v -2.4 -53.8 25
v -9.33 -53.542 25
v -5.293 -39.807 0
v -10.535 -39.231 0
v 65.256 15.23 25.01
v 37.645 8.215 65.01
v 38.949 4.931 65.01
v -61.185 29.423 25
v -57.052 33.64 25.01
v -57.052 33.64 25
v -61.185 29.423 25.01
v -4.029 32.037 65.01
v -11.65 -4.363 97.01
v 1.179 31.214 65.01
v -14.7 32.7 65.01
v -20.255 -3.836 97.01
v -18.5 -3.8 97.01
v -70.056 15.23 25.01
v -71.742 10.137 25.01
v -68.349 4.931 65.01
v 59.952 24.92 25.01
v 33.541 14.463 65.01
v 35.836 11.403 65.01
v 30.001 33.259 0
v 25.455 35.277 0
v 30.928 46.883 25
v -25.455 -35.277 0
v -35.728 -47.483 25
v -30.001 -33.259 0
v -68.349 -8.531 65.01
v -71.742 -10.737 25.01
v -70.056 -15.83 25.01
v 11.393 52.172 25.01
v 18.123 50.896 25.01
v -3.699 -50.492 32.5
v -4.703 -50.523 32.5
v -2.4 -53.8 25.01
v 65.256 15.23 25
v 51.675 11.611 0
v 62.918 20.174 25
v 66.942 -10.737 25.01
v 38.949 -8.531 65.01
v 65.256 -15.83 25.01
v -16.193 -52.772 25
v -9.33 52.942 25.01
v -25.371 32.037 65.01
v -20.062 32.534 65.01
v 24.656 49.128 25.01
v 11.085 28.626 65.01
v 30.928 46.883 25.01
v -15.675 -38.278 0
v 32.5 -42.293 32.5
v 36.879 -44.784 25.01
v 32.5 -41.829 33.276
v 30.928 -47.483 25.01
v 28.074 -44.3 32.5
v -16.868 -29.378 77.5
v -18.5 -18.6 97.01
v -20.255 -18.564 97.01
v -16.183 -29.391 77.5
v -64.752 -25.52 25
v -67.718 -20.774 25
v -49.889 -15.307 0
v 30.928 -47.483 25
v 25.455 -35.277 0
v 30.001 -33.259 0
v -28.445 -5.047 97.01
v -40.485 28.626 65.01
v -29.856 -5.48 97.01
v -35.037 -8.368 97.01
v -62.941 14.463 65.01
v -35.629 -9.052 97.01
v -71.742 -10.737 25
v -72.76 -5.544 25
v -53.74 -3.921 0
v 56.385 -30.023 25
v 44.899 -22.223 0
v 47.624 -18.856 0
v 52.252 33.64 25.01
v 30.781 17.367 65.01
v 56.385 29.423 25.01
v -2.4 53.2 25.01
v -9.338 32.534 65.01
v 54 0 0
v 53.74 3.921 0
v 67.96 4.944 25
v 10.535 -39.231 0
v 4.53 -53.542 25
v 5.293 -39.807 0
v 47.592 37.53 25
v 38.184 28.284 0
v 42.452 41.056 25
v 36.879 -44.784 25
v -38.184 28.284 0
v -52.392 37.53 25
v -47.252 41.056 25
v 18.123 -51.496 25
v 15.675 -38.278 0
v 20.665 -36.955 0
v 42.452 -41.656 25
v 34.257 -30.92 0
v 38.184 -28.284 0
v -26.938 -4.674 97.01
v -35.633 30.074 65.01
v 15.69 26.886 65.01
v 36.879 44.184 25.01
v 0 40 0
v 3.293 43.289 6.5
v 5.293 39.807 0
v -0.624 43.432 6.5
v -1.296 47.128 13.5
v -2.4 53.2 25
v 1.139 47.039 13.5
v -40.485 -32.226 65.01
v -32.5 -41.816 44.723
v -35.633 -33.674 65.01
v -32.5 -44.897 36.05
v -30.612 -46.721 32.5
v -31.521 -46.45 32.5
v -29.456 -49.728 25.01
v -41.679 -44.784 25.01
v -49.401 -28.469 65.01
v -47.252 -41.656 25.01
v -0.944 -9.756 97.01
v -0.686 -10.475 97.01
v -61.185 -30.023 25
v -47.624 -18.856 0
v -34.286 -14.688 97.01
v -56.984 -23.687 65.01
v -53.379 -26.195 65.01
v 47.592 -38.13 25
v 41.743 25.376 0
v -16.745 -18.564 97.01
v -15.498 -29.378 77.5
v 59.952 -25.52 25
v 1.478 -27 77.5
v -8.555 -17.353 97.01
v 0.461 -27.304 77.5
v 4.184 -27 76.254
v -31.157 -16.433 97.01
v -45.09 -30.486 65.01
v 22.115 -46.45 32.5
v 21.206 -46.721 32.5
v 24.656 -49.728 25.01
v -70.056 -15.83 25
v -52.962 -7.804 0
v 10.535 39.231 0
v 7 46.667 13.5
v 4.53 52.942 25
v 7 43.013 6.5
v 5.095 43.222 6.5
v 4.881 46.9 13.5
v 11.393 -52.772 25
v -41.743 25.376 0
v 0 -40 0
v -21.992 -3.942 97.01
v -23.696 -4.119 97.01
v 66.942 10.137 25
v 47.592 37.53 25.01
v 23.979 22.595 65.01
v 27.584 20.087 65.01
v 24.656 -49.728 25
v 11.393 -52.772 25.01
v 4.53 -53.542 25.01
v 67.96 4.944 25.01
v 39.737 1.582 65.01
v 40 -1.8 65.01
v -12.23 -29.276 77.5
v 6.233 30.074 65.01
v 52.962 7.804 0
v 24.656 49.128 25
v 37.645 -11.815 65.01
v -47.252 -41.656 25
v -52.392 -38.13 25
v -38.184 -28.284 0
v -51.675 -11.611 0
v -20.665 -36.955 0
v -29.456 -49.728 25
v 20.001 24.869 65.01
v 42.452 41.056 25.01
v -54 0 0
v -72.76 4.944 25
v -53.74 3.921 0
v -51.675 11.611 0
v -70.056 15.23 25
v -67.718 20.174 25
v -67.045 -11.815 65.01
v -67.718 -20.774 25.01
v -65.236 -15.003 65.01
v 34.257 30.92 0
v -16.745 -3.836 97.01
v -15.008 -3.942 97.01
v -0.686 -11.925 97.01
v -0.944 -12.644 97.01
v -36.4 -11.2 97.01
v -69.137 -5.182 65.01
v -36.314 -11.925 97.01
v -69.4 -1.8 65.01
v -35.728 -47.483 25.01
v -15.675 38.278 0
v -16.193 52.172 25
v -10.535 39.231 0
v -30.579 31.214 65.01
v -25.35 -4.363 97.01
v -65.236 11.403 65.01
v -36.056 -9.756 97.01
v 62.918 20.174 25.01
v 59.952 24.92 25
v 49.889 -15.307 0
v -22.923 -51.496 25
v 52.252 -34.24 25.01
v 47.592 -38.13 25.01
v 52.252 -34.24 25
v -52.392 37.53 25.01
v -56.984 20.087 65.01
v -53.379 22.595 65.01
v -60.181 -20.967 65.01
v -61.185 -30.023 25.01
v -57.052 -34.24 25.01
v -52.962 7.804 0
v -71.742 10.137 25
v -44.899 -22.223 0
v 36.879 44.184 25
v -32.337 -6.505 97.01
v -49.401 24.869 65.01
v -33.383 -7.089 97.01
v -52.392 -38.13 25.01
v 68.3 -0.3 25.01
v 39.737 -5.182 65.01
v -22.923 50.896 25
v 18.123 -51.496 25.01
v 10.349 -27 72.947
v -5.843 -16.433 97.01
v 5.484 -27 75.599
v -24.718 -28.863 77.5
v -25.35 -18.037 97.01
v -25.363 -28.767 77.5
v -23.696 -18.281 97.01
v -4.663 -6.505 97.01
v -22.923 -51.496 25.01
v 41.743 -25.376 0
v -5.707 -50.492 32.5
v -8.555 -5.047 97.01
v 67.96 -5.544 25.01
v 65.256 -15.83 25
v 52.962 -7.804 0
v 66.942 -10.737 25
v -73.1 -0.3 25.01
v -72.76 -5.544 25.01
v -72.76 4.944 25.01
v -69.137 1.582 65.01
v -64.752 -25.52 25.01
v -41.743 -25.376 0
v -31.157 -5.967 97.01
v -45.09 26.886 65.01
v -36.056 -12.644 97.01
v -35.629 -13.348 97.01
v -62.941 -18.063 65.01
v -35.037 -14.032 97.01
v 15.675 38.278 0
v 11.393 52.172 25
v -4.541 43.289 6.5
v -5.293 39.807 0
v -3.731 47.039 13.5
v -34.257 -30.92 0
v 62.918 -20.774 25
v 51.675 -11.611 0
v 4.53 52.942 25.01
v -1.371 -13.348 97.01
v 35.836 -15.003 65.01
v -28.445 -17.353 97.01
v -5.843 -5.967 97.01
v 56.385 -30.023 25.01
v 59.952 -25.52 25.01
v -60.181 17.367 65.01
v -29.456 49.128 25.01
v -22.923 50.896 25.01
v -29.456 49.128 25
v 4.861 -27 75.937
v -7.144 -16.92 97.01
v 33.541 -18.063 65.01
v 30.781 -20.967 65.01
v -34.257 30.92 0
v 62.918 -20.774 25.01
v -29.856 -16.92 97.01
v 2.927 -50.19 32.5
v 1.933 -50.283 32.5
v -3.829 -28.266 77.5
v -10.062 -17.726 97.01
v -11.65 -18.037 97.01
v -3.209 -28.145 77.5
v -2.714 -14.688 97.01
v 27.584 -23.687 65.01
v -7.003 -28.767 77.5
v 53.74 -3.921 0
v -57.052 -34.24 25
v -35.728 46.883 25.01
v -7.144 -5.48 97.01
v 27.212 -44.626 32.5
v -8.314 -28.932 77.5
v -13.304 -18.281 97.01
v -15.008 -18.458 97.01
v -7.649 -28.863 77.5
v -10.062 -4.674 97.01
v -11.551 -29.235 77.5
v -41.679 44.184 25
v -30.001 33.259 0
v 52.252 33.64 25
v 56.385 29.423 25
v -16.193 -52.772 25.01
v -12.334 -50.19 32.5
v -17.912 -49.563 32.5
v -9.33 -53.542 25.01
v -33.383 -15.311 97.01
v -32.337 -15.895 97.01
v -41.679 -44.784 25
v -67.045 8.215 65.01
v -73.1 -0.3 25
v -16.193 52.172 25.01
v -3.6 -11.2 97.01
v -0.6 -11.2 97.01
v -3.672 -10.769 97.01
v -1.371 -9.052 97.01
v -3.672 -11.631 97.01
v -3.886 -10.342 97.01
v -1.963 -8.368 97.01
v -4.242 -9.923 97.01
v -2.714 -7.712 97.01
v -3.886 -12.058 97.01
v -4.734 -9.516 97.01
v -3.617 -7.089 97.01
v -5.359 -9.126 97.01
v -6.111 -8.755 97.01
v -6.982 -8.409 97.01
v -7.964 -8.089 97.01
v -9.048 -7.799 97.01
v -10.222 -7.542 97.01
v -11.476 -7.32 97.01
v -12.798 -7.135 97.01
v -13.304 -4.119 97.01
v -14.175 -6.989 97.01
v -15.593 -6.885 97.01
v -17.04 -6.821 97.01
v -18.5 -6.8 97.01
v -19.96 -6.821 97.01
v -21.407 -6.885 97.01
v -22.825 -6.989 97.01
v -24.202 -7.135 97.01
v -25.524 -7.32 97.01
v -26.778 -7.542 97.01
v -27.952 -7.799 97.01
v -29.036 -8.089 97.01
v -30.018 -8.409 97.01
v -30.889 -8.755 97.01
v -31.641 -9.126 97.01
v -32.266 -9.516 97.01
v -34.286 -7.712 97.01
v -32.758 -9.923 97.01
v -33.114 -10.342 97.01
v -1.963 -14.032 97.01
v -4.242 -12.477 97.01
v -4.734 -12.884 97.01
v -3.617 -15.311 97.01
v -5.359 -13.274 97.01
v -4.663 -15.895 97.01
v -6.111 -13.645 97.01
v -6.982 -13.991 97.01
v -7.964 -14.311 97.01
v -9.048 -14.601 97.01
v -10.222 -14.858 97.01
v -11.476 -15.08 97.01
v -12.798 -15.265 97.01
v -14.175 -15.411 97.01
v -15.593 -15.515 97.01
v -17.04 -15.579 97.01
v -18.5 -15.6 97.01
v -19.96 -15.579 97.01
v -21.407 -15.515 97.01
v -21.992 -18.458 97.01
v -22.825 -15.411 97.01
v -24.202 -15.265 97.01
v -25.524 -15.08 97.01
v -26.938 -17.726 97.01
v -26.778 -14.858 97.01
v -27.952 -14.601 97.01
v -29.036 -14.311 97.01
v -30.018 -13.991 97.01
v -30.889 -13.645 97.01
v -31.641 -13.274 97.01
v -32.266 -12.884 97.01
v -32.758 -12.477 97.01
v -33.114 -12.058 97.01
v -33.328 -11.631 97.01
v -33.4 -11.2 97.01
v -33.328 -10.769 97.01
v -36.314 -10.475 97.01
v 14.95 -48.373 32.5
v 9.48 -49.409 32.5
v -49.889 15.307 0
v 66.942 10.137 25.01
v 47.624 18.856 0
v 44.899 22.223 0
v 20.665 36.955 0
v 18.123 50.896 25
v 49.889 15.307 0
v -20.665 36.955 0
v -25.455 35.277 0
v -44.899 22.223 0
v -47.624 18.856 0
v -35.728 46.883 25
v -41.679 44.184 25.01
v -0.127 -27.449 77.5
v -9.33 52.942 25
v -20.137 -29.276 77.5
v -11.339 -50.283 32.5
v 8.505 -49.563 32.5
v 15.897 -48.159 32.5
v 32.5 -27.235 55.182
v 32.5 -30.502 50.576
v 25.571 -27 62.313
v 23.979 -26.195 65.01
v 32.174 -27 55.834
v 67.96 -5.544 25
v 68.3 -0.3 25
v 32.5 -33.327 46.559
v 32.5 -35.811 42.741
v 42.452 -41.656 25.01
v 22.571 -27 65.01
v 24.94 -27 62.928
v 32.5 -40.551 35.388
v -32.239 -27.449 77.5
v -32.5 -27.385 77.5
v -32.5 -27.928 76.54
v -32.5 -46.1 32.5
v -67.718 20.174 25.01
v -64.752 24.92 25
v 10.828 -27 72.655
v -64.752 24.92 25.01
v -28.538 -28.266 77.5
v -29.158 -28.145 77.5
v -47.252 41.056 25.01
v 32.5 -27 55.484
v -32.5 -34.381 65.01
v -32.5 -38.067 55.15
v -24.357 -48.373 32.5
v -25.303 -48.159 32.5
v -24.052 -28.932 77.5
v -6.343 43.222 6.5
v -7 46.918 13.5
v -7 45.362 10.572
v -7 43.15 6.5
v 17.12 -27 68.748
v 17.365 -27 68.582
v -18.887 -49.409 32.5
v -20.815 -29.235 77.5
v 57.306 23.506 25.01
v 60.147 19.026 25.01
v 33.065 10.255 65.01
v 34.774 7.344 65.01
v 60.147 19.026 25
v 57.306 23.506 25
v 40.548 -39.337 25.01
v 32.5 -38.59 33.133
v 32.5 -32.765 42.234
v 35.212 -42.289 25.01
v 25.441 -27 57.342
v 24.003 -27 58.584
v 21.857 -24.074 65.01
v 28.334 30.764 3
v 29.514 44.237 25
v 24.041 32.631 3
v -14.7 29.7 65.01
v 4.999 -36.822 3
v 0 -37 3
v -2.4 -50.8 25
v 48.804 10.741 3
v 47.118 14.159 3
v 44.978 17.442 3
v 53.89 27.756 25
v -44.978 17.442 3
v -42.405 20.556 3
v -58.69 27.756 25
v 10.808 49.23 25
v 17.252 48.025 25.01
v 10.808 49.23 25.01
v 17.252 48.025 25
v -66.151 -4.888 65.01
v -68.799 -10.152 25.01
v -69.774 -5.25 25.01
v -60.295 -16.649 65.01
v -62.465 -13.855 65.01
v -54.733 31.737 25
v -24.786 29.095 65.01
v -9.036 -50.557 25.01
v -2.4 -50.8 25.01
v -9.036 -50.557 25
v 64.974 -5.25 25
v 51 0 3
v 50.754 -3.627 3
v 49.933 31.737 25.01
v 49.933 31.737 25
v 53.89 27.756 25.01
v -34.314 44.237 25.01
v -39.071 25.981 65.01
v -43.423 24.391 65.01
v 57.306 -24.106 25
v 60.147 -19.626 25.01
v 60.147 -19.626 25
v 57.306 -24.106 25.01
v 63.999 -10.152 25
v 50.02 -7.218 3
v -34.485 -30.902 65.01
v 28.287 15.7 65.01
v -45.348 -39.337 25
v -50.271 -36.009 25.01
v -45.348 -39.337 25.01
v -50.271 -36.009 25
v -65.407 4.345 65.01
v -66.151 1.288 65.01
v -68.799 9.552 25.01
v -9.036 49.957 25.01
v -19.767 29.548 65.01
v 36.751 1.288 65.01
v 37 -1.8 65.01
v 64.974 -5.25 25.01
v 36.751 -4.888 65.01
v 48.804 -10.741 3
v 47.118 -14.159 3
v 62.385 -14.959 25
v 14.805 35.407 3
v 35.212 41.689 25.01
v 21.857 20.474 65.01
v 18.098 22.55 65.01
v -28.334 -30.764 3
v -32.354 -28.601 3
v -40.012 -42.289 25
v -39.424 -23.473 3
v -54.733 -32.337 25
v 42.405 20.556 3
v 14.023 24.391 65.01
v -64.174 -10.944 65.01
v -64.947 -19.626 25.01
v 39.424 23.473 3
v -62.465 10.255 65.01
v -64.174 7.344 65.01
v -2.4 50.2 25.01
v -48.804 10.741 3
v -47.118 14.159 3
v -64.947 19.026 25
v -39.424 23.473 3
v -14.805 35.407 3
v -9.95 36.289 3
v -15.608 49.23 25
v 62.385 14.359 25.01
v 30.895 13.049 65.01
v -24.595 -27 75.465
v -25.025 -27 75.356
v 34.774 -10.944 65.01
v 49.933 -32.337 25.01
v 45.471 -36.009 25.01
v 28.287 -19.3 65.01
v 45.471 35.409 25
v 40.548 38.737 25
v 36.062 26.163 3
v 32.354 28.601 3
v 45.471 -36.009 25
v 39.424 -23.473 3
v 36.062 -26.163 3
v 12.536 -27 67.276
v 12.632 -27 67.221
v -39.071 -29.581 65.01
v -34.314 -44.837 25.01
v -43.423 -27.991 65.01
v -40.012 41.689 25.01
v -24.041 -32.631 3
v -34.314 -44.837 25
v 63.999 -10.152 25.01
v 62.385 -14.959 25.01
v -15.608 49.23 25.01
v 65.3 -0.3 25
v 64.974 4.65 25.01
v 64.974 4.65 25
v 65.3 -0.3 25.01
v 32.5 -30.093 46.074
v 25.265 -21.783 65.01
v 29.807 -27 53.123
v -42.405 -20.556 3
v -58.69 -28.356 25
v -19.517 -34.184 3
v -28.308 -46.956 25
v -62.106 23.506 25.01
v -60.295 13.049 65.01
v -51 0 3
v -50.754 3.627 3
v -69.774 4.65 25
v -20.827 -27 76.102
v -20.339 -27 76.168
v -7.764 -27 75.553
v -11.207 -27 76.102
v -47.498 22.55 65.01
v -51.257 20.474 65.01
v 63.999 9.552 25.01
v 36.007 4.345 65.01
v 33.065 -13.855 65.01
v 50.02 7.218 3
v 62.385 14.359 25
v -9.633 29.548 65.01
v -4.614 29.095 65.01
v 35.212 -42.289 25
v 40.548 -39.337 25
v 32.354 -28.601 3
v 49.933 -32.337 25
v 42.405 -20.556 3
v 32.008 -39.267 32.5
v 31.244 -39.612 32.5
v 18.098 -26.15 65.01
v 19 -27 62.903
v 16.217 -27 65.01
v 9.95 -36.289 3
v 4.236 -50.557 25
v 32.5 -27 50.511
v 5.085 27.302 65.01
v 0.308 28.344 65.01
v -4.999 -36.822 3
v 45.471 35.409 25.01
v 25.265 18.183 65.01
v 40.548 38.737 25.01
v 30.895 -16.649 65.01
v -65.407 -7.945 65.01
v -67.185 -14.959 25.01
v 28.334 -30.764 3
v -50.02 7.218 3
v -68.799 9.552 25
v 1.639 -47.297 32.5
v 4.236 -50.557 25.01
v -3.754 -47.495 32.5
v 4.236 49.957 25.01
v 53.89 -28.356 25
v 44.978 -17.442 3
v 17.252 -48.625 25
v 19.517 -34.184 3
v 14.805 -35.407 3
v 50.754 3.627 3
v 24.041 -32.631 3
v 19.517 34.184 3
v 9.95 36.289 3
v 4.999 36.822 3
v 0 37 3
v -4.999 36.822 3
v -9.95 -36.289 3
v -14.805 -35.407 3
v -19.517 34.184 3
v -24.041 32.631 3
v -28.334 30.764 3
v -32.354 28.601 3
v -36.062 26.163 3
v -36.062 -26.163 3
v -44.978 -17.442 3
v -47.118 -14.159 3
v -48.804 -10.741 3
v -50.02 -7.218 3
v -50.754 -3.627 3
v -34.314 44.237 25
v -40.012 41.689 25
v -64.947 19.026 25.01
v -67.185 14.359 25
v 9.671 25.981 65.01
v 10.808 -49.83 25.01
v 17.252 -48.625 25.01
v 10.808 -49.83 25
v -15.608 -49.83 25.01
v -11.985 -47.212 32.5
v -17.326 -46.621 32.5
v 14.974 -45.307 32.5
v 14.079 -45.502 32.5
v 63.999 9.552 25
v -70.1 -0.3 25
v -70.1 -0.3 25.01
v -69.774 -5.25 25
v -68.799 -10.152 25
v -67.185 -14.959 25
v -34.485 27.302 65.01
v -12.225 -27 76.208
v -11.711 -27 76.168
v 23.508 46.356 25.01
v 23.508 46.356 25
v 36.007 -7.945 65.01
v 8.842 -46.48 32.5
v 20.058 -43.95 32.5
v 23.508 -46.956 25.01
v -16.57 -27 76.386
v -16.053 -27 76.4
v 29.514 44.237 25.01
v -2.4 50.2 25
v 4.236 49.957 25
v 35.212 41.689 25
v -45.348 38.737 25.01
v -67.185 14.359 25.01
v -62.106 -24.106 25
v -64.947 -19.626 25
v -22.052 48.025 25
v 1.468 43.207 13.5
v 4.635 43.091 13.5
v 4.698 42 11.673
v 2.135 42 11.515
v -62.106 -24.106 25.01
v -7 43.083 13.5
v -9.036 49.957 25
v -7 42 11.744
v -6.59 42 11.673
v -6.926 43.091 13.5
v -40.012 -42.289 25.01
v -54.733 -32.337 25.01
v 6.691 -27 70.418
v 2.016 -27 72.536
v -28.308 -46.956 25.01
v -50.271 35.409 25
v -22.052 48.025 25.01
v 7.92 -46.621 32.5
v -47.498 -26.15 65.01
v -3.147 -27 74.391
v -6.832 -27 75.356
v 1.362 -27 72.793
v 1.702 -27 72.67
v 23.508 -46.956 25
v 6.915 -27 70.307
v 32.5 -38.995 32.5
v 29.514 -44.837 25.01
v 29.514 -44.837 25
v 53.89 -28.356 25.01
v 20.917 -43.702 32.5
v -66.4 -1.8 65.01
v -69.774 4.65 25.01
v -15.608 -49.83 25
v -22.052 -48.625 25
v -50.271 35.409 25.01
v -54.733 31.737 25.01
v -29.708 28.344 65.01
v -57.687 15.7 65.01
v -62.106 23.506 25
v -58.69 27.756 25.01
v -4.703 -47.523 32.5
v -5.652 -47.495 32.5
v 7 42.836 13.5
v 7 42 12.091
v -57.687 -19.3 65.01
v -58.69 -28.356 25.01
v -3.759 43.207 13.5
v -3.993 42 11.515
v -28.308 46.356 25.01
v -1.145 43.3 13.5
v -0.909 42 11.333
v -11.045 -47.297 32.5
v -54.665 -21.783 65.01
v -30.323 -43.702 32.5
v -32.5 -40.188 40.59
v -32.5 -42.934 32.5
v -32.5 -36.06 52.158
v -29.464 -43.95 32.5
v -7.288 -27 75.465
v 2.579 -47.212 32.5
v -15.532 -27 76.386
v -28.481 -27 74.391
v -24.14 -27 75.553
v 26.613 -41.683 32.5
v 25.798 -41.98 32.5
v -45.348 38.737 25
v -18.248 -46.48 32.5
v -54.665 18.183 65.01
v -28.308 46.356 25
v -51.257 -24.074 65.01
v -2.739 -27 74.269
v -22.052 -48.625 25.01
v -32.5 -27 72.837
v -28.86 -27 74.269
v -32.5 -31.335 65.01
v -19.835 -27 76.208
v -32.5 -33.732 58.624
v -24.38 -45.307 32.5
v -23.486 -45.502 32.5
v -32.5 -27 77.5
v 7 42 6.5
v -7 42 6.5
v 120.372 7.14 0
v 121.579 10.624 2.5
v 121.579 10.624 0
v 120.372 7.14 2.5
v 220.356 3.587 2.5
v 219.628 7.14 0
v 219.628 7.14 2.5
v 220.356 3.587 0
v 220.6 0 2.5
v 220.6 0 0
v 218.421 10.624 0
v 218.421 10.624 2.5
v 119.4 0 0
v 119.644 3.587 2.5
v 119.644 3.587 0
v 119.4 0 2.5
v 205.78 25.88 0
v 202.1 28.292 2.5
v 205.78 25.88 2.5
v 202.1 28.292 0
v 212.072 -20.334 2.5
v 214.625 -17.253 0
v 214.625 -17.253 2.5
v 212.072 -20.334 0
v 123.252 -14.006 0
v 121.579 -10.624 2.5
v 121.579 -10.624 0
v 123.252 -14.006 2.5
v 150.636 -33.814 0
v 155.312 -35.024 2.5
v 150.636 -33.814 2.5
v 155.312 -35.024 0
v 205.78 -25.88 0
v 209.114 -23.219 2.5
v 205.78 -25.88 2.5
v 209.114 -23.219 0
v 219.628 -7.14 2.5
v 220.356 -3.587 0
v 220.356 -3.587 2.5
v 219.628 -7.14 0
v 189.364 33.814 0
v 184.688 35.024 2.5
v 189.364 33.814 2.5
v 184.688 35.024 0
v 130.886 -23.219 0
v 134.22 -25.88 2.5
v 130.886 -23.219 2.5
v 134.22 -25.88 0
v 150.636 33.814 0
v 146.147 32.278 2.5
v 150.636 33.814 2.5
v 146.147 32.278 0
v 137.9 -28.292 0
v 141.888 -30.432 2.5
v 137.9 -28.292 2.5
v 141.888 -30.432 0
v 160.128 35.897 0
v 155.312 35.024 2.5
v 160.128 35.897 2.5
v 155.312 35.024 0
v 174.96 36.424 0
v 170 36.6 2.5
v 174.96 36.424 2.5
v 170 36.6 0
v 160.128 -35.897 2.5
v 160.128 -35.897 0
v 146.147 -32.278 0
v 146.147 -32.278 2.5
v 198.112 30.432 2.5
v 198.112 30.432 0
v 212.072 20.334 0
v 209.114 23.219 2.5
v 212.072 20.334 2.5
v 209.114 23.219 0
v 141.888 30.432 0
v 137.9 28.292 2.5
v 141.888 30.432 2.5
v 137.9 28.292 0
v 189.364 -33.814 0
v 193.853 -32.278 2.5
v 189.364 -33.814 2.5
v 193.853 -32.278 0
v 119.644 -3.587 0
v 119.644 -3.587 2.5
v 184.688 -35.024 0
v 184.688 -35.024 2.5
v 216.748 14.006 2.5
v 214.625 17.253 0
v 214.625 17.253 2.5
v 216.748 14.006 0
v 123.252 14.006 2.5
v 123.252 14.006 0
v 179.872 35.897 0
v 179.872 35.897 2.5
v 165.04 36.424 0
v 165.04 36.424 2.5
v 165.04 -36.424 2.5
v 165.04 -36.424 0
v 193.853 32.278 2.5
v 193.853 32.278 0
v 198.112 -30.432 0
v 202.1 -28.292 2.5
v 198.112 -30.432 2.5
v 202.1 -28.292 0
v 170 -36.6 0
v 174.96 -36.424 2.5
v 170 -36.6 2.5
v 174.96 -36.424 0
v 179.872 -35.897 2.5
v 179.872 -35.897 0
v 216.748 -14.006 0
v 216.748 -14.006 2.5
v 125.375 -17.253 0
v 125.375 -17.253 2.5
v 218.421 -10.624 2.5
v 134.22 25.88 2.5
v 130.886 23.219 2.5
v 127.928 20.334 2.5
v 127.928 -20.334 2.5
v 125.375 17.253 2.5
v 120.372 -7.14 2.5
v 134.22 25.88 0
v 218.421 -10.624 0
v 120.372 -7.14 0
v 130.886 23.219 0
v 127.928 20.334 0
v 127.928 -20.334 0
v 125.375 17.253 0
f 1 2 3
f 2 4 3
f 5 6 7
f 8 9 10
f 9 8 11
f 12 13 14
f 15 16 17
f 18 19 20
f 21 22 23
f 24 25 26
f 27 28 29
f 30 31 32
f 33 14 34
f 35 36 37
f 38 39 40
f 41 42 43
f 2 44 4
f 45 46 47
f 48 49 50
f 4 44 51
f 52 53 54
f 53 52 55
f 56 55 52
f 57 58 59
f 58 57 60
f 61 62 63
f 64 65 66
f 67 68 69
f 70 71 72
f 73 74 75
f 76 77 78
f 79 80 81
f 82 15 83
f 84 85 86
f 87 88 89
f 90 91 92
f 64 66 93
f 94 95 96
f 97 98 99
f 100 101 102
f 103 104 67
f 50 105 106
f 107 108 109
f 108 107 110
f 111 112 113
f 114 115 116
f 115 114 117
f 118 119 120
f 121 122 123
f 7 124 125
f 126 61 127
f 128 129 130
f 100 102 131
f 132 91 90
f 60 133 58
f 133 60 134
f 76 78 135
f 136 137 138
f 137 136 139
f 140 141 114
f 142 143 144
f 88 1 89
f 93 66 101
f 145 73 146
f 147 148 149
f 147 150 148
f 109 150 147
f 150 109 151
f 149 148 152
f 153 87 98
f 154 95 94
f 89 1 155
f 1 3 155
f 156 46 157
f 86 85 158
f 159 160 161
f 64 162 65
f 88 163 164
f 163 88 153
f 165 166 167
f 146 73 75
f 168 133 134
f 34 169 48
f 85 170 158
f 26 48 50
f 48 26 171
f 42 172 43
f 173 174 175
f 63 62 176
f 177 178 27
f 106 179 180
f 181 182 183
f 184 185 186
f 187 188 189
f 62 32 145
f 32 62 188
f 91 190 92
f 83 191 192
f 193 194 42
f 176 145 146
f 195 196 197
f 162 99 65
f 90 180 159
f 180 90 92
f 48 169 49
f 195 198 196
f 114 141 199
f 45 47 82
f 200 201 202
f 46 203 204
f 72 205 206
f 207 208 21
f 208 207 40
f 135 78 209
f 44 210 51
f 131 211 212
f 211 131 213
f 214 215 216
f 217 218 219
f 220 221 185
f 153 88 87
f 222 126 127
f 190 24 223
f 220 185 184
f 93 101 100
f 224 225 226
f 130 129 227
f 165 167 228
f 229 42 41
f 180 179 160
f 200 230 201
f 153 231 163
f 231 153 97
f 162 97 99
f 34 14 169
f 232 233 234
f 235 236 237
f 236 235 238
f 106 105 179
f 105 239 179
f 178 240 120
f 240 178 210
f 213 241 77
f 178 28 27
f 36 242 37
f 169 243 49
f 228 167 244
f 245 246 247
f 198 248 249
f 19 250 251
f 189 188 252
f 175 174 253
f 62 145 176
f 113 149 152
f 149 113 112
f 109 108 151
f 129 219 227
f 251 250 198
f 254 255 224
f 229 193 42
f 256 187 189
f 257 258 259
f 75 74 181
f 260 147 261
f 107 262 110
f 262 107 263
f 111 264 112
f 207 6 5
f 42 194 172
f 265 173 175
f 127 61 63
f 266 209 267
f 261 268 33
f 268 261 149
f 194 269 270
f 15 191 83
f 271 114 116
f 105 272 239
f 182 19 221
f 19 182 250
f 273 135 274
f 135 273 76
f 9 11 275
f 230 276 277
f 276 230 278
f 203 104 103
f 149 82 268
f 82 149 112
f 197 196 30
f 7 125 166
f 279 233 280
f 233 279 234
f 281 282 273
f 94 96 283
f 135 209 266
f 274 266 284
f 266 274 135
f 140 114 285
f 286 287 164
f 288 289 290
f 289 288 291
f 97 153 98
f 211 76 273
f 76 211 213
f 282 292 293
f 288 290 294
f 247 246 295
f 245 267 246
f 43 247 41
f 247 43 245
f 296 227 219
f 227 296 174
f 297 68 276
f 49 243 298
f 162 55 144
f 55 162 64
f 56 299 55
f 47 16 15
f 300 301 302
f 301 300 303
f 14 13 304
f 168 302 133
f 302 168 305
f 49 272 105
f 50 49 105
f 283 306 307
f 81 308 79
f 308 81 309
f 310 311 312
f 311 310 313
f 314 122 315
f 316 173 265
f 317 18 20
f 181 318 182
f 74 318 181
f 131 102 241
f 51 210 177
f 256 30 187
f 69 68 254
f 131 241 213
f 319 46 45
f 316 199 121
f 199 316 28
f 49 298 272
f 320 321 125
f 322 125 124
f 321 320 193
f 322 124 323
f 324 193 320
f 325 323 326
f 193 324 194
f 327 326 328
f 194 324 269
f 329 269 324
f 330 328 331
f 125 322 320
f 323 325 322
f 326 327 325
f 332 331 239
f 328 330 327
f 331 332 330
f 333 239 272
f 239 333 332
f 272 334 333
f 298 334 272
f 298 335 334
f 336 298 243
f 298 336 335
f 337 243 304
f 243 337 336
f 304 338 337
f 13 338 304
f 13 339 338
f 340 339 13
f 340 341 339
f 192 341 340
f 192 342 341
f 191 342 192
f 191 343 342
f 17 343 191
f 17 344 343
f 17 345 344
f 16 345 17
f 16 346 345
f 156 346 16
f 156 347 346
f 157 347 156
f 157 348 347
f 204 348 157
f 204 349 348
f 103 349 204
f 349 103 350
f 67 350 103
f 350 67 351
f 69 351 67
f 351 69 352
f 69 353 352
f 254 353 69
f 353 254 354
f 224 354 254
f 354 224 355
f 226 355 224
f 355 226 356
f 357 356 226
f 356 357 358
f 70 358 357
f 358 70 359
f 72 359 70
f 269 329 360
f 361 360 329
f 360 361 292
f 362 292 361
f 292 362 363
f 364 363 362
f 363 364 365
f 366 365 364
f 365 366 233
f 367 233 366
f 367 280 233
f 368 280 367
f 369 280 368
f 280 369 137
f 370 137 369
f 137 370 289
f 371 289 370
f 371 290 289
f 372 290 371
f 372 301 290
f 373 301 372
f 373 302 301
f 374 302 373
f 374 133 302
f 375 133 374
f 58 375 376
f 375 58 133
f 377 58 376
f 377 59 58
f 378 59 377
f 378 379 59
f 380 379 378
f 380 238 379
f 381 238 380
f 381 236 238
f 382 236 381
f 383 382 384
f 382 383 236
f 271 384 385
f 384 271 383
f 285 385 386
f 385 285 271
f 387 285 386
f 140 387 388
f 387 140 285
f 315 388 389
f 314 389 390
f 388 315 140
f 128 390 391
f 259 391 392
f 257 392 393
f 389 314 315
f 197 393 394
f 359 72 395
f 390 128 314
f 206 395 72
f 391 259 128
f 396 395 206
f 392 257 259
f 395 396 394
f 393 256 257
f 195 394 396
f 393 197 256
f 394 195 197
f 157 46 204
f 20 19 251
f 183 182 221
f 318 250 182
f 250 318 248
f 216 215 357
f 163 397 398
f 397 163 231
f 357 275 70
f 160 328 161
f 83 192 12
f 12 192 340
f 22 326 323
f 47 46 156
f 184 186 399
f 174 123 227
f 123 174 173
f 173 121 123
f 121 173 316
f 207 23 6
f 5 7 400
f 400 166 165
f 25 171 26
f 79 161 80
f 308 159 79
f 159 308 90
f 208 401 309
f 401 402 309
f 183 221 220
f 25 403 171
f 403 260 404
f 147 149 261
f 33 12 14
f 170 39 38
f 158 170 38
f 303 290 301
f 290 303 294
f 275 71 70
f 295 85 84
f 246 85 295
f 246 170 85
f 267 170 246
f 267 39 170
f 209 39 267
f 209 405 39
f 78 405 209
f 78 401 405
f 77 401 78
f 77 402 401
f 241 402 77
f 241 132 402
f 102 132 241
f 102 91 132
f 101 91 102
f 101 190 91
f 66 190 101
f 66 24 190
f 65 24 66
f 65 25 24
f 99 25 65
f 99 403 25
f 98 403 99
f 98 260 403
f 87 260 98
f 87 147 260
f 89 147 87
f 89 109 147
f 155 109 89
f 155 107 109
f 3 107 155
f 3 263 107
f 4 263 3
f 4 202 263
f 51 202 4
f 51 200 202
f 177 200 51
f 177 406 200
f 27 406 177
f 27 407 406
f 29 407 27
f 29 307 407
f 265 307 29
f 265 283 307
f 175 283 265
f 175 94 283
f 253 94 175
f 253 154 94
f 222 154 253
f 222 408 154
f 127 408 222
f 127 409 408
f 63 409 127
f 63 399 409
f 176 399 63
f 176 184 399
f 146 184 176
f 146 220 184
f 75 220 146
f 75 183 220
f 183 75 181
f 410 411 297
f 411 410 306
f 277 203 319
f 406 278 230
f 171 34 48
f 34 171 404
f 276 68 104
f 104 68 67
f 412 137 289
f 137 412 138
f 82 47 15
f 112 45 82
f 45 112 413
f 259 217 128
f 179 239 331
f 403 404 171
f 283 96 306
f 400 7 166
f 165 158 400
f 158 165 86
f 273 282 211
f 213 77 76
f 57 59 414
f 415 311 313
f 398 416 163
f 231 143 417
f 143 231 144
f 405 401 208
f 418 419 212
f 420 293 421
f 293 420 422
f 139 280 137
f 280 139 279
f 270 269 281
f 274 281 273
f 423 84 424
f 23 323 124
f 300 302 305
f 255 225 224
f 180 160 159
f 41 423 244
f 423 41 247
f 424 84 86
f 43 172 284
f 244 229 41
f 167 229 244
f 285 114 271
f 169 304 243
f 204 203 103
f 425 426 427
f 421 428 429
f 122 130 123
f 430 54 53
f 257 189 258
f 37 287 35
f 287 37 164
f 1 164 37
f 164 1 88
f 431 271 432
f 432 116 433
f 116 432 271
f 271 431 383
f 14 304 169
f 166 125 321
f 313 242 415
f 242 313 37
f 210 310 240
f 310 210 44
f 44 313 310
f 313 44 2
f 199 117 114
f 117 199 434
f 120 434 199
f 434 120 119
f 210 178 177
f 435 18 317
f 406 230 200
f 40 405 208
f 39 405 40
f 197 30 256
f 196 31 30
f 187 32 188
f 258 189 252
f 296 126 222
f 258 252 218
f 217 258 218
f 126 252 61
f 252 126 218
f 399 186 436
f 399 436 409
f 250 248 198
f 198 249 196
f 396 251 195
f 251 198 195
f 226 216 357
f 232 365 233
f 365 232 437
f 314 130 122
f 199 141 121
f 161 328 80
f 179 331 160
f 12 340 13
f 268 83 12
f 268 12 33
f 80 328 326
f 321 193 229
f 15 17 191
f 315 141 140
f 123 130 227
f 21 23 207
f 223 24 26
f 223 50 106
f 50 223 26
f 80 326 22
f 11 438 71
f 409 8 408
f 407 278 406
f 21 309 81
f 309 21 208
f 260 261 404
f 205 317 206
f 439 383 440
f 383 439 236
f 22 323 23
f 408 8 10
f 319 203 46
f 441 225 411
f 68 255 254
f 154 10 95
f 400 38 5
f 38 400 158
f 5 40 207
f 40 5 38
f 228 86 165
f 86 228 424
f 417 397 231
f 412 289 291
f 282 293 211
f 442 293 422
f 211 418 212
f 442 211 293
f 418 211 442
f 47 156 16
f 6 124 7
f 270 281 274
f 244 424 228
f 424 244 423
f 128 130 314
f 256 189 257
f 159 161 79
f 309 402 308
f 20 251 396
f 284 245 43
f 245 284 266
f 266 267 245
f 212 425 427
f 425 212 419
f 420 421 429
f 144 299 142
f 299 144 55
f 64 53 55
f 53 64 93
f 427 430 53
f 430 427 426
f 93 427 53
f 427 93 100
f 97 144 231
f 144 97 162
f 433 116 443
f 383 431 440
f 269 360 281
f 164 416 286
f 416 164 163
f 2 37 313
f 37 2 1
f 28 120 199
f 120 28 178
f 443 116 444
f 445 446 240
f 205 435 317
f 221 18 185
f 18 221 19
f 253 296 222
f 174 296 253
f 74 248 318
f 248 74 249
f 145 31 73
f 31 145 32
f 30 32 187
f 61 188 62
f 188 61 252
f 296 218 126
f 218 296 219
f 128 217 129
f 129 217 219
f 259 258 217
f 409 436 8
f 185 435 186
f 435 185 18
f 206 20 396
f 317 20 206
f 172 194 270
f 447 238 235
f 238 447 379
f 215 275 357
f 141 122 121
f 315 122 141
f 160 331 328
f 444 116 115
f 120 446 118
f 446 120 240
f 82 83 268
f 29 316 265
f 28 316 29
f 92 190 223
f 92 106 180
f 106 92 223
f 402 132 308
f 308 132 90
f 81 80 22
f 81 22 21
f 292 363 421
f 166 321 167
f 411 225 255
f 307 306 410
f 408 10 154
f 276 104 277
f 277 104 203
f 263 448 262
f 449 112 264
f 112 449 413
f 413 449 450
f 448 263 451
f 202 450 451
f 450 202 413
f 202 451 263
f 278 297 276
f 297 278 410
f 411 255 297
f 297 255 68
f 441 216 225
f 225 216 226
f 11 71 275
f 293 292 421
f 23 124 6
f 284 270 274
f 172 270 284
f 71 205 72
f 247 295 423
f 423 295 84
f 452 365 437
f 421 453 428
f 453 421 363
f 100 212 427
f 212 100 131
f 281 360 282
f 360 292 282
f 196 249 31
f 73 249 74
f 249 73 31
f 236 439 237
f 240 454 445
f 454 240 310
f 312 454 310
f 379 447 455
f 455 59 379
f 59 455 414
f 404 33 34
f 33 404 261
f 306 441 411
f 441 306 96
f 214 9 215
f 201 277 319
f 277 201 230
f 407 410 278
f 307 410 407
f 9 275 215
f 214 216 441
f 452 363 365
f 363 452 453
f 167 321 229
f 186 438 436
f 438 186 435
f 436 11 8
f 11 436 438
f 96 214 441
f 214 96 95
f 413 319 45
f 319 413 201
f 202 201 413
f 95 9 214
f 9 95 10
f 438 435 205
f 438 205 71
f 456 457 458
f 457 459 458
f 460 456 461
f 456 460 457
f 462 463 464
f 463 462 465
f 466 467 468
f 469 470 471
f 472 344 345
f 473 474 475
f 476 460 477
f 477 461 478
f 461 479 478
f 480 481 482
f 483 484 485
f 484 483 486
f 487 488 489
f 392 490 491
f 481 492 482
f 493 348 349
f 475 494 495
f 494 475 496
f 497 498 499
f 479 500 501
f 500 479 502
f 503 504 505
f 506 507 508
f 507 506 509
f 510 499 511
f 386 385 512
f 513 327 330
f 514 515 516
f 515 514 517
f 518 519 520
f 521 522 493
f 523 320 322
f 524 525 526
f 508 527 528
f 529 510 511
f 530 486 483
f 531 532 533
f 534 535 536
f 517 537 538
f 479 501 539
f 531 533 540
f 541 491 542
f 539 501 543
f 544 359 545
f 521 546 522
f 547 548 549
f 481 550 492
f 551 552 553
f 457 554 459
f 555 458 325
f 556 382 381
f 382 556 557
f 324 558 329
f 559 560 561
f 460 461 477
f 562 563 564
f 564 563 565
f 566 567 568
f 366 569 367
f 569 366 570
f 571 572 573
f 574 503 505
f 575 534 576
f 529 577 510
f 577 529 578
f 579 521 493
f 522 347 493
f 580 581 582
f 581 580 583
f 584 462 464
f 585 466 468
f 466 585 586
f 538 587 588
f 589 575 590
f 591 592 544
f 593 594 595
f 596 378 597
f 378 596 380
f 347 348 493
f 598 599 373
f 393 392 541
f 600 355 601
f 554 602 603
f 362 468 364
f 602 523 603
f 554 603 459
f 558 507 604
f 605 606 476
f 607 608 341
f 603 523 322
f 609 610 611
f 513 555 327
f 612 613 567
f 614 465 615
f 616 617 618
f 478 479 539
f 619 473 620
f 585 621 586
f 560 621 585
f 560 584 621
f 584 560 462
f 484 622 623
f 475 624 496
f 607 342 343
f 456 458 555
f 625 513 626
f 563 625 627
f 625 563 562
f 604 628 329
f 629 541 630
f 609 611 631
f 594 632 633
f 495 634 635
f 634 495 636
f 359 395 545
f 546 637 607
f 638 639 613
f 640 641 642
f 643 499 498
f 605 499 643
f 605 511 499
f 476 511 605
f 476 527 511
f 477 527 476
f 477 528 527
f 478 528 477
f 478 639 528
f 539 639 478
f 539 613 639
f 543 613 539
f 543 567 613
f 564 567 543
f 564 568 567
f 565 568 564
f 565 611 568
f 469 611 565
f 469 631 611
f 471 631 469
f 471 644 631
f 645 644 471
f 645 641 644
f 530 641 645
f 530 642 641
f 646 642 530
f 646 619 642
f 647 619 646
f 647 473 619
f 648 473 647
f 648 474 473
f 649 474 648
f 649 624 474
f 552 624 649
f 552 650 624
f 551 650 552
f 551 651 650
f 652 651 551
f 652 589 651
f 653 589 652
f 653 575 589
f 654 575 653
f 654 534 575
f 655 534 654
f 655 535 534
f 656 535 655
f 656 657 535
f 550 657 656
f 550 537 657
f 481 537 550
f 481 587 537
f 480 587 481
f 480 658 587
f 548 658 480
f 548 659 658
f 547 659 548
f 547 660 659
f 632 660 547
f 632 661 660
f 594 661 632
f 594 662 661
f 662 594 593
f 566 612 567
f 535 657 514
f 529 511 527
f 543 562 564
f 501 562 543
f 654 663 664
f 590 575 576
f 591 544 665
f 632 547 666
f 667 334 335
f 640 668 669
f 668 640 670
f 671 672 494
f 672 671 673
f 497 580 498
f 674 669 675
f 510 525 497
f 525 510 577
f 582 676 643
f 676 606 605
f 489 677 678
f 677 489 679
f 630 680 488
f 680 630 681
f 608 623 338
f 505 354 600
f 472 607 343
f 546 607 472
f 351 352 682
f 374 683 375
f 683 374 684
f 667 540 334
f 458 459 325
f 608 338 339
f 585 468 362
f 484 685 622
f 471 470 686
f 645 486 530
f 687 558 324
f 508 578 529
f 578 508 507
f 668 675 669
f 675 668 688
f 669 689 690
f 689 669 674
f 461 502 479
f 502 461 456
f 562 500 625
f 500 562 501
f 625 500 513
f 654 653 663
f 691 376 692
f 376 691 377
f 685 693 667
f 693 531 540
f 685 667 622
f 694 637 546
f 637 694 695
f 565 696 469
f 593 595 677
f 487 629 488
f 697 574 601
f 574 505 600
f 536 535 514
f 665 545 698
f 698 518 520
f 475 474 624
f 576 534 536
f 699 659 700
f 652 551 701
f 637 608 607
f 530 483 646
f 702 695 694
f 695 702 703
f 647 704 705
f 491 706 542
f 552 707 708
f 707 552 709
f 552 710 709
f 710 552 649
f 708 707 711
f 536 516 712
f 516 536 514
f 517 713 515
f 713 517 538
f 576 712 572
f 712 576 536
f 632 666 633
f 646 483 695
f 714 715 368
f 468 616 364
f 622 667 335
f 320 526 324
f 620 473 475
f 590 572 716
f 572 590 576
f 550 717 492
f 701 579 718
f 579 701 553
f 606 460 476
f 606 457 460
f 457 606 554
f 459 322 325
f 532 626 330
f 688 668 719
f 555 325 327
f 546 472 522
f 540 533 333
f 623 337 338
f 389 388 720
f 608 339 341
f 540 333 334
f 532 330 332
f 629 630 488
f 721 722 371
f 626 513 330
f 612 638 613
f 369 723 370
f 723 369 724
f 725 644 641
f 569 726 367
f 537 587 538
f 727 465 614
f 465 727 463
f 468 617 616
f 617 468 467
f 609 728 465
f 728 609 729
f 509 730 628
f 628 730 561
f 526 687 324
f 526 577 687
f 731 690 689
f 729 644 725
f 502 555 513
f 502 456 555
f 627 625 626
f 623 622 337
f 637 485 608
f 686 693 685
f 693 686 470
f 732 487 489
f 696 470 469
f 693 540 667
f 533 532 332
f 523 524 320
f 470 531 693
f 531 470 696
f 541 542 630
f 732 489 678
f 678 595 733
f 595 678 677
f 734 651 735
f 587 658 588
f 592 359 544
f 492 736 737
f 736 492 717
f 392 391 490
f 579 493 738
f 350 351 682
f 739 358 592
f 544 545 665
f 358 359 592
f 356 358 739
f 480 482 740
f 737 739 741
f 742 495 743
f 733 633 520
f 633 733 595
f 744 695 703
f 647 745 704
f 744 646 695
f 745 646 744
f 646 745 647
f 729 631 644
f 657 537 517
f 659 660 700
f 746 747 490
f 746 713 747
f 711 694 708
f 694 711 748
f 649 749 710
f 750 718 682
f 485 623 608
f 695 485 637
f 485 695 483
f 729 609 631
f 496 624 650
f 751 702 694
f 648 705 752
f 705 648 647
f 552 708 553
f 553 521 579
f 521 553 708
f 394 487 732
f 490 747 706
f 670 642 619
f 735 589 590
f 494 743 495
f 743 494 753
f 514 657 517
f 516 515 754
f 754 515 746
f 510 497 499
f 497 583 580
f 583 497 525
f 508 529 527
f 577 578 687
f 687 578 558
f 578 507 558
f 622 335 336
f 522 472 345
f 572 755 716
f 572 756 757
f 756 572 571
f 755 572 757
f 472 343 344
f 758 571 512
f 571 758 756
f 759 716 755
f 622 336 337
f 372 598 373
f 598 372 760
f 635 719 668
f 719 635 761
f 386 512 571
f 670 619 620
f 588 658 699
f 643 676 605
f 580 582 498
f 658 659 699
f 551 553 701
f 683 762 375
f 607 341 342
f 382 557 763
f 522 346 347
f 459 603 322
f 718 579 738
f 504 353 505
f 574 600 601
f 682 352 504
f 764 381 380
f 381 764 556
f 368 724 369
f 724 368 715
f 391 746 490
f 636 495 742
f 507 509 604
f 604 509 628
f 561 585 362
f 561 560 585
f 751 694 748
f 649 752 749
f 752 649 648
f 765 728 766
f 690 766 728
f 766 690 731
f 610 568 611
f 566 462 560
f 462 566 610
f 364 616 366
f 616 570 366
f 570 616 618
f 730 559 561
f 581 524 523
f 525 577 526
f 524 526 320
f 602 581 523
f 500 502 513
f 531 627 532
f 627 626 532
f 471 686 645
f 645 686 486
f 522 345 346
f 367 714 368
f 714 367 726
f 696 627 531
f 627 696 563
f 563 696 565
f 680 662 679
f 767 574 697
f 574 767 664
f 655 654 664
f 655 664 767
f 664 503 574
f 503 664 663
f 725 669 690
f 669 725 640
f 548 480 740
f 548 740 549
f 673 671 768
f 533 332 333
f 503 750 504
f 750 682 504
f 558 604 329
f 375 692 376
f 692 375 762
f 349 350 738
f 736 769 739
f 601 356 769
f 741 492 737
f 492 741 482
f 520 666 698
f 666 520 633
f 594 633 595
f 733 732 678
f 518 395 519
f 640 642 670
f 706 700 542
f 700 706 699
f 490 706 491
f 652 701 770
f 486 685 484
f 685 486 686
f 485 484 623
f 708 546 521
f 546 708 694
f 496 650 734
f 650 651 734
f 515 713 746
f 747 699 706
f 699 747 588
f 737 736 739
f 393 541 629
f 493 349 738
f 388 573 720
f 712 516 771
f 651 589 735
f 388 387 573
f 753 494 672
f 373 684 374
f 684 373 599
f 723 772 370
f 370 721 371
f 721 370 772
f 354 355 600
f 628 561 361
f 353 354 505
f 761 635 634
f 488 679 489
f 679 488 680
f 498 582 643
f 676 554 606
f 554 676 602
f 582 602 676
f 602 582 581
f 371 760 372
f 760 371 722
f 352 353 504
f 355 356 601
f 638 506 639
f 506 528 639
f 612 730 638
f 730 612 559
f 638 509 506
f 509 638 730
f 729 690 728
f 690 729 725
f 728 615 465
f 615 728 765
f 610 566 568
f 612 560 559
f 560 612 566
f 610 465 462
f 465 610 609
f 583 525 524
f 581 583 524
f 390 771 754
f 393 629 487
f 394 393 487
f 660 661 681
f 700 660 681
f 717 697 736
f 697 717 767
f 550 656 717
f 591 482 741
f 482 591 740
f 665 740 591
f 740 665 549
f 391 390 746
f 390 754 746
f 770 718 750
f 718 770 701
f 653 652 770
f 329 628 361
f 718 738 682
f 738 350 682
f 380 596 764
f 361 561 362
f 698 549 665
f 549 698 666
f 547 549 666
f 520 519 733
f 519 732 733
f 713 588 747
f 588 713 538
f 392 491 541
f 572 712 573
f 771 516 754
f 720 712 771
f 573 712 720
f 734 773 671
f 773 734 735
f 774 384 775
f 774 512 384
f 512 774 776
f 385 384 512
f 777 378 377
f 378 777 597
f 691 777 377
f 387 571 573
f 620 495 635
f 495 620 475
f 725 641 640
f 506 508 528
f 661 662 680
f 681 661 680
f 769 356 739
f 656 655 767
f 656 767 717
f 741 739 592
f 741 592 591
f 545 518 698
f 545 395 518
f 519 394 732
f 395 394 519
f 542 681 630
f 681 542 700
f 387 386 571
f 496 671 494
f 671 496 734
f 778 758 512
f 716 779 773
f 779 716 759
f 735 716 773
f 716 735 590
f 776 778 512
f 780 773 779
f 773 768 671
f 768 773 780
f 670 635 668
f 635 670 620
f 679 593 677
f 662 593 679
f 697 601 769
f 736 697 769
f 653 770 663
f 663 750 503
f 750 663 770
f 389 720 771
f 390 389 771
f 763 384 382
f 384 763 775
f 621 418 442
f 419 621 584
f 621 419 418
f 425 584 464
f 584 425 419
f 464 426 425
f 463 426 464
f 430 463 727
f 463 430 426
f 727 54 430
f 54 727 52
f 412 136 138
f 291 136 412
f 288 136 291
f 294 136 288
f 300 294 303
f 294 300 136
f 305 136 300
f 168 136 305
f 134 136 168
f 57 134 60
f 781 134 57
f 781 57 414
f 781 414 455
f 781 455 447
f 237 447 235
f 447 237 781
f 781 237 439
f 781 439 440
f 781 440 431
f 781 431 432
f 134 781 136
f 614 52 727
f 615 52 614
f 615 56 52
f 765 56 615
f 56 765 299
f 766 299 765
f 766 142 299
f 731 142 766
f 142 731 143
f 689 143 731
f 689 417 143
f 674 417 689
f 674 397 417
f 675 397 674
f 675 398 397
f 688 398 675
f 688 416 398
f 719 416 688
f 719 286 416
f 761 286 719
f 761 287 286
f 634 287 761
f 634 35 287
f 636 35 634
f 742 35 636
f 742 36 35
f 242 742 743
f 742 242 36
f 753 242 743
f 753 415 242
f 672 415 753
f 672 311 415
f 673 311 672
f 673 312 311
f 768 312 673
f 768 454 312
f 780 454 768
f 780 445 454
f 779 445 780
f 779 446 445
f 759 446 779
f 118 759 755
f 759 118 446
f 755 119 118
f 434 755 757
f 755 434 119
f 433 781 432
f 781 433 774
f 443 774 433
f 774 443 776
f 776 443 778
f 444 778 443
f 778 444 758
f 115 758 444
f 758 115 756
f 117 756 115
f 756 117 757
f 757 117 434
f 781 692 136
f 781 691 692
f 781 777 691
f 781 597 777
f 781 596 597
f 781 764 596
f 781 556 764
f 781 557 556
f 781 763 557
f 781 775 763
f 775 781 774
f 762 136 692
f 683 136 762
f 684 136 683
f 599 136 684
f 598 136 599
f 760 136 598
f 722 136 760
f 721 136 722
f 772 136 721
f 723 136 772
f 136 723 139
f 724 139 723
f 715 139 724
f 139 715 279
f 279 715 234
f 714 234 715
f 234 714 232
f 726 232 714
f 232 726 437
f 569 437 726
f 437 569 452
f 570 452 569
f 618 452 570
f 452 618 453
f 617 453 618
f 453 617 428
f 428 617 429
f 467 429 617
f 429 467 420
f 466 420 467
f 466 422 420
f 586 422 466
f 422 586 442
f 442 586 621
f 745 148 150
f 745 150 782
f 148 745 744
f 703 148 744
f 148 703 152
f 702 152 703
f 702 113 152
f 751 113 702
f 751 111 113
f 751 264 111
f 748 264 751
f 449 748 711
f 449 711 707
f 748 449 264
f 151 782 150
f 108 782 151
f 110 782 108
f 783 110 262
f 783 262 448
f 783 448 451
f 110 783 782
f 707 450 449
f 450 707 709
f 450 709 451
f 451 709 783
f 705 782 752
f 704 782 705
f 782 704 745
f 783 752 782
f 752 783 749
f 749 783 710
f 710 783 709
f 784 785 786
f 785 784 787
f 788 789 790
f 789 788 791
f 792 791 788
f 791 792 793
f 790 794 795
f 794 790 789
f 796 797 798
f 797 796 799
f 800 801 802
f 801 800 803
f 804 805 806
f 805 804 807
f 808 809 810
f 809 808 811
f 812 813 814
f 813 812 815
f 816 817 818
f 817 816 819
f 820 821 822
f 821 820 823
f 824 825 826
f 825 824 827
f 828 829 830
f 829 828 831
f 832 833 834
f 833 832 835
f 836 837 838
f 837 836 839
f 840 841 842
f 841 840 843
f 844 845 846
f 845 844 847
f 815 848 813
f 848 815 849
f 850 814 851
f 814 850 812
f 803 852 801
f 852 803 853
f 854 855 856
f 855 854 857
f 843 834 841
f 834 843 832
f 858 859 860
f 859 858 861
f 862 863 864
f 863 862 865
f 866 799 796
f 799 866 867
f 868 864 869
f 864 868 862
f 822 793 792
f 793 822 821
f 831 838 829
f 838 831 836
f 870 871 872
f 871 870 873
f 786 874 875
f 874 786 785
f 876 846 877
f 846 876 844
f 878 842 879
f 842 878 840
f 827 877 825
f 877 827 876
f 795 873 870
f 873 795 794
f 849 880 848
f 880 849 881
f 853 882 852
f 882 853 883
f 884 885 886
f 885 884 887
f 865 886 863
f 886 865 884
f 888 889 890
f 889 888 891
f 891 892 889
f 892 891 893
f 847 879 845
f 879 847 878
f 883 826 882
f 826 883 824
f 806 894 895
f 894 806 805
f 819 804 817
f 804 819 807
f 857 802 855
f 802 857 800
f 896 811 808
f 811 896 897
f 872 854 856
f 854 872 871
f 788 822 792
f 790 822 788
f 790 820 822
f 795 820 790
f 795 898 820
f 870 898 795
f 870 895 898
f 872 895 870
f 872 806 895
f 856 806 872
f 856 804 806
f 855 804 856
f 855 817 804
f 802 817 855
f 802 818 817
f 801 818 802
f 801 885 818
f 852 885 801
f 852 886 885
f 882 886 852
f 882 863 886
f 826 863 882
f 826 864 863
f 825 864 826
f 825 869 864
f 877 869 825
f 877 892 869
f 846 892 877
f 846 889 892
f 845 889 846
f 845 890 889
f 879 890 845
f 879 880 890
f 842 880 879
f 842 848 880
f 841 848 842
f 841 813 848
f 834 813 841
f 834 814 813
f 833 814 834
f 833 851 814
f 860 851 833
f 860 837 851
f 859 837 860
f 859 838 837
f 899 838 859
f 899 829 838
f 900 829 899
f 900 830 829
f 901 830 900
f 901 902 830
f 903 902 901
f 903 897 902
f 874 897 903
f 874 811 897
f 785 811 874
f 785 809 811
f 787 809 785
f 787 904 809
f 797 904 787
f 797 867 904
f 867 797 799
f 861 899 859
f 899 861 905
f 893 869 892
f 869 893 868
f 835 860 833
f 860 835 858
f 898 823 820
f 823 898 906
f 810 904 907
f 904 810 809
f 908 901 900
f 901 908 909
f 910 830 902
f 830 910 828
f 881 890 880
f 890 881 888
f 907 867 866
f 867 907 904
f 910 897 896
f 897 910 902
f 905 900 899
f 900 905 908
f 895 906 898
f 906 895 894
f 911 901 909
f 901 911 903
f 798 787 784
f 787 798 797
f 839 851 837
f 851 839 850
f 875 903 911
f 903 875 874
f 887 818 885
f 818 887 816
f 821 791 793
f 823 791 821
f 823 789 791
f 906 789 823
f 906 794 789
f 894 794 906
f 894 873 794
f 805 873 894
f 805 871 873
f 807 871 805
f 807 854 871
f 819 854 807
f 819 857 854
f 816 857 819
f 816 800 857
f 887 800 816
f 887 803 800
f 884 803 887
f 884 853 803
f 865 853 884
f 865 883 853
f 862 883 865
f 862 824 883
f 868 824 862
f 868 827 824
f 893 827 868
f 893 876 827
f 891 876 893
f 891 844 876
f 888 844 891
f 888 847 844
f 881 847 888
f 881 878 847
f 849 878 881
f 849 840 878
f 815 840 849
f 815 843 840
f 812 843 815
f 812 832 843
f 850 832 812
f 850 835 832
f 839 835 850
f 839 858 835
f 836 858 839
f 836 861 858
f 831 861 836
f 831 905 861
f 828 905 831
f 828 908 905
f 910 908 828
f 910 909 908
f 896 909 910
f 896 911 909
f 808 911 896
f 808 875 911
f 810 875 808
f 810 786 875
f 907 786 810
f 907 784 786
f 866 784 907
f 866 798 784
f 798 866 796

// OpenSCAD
// ============================================================
// SEISMONITOR ENCLOSURE — Organic dome monolith (v1)
// Parametric OpenSCAD — reverse-engineered from
// SeisMonitor_Prototype001b.stl (Rhinoceros, Apr 2026)
//
// Body construction: hull() of 4 positioned elliptical cross-
// sections reproduces the expanding-then-tapering dome profile
// and ~20 mm X-lean of the original Rhino prototype.
//
// Overall envelope (matching STL): ≈145 × 108 × 97 mm
//   Base (Z=0):   108 × 80 mm ellipse
//   Widest (Z=25): 141 × 107 mm ellipse  (+X bulge)
//   Mid (Z=65):   109 × 69 mm ellipse    (centre drifts −X)
//   Top (Z=97):    36 × 15 mm ellipse    (further −X lean)
//
// Parts:
//   PART = "shell"       → main enclosure body
//   PART = "base_cover"  → flat snap-on base plate
//   PART = "all"         → both side-by-side
//
// Print suggestion: dome-up orientation, tree supports for the
// undercut base rim, 0.2 mm layers, 3 perimeters, PETG or PLA.
// ============================================================

PART = "all";   // "shell", "base_cover", or "all"

$fn = 64;

// ─── Wall thickness ──────────────────────────────────────────
wall = 3.0;

// ─── Cross-section control points ────────────────────────────
// [z_height, x_center_offset, y_center_offset, x_radius, y_radius]
// Offsets are relative to the base footprint centre.
// Derived from STL slice analysis.
cs = [
  [  0,    0.0,    0.0,  54.0,  40.0 ],   // Z=0  — base footprint
  [ 25,   -2.4,   -0.3,  70.7,  53.5 ],   // Z=25 — widest section
  [ 65,  -14.7,   -1.8,  54.7,  34.5 ],   // Z=65 — upper taper start
  [ 97,  -18.5,  -11.2,  17.9,   7.4 ],   // Z=97 — top crown
];

// ─── Screen / display placeholder ────────────────────────────
// Screen is on the FRONT face (−Y face of the dome).
// Coordinate system: base centre = (0,0,0).
// At Z=55: outer front face ≈ Y = −40.7 mm  (from hull() interpolation).
// The cut slab runs from Y=−52 to Y=−30 → passes through the 3 mm front wall.
// Adjust w/h once PCB / display specs are confirmed.
scr_w       = 65;    // screen window width (mm)
scr_h       = 45;    // screen window height (mm)
scr_z_ctr   = 55;    // Z-centre of window
scr_y_cut   = -52;   // Y-start of cut slab (outside the front face)
scr_y_len   = 25;    // slab depth in Y (must span the ~3 mm wall)

// ─── USB-C / power port (rear base) ──────────────────────────
// At Z=10: outer back face ≈ Y = +45.3 mm  (hull() interpolation).
// The cut slab runs from Y=+42 to Y=+55 → passes through the ~3 mm rear wall.
usb_w       = 14;
usb_h       = 7;
usb_z_ctr   = 10;    // height above base
usb_y_cut   = 42;    // Y-start of cut slab (just inside back face)
usb_y_len   = 14;    // slab depth in Y (must span the rear wall)

// ─── Base cover clearance ────────────────────────────────────
cover_t       = 2.5;
cover_gap     = 0.4;   // radial gap between shell rim and cover

// ─── Helpers ─────────────────────────────────────────────────

// Thin elliptical disk used as a hull() seed.
module ellipse_disk(rx, ry, h = 0.01) {
  scale([rx, ry, 1]) cylinder(r = 1, h = h, $fn = 64);
}

// ─── Core solids ─────────────────────────────────────────────

// Outer envelope: hull of the 4 cross-sections.
module outer_solid() {
  hull()
    for (c = cs)
      translate([c[1], c[2], c[0]])
        ellipse_disk(c[3], c[4]);
}

// Inner cavity: same profile, radii shrunk by wall, floor raised by wall.
module inner_solid() {
  hull()
    for (c = cs)
      translate([c[1], c[2], (c[0] == 0) ? wall : c[0]])
        ellipse_disk(max(1, c[3] - wall), max(1, c[4] - wall));
}

// ─── Features ────────────────────────────────────────────────

// Screen window: rectangular cut through the −Y (front) face.
// The slab starts outside the dome (scr_y_cut) and runs scr_y_len inward,
// passing cleanly through the ≈3 mm front wall.
module screen_window_cut() {
  translate([-scr_w/2, scr_y_cut, scr_z_ctr - scr_h/2])
    cube([scr_w, scr_y_len, scr_h]);
}

// USB-C pocket: through the +Y (rear) face near the base.
// Slab starts just below the outer back surface and runs inward.
module usb_pocket_cut() {
  translate([-usb_w/2, usb_y_cut, usb_z_ctr - usb_h/2])
    cube([usb_w, usb_y_len, usb_h]);
}

// Bottom opening: removes the base so the PCB can be inserted,
// leaving a perimeter rim of width wall.
// (Uncomment once PCB dimensions are confirmed.)
/*
module base_opening() {
  // slightly smaller than base footprint
  hull()
    translate([cs[0][1], cs[0][2], -1])
      ellipse_disk(cs[0][3] - wall - 2, cs[0][4] - wall - 2, h=wall+2);
}
*/

// ─── Main shell ──────────────────────────────────────────────
module shell() {
  difference() {
    union() {
      // Hollow wall
      difference() {
        outer_solid();
        inner_solid();
      }
      // TODO: add PCB mount bosses, snap catches, etc.
    }

    // Screen cut-out
    screen_window_cut();

    // USB port
    usb_pocket_cut();
  }
}

// ─── Base cover (flat snap-on disc) ──────────────────────────
module base_cover() {
  rx = cs[0][3] - wall - cover_gap;
  ry = cs[0][4] - wall - cover_gap;
  // Simple flat disc — add snap arms / screws once feature list finalised
  scale([rx, ry, 1]) cylinder(r=1, h=cover_t, $fn=64);
}

// ─── Render selection ────────────────────────────────────────
if (PART == "shell") {
  color("#BEC8B8") shell();
} else if (PART == "base_cover") {
  color("#BEC8B8") base_cover();
} else {
  color("#BEC8B8") shell();
  color("#BEC8B8") translate([170, 0, 0]) base_cover();
}
